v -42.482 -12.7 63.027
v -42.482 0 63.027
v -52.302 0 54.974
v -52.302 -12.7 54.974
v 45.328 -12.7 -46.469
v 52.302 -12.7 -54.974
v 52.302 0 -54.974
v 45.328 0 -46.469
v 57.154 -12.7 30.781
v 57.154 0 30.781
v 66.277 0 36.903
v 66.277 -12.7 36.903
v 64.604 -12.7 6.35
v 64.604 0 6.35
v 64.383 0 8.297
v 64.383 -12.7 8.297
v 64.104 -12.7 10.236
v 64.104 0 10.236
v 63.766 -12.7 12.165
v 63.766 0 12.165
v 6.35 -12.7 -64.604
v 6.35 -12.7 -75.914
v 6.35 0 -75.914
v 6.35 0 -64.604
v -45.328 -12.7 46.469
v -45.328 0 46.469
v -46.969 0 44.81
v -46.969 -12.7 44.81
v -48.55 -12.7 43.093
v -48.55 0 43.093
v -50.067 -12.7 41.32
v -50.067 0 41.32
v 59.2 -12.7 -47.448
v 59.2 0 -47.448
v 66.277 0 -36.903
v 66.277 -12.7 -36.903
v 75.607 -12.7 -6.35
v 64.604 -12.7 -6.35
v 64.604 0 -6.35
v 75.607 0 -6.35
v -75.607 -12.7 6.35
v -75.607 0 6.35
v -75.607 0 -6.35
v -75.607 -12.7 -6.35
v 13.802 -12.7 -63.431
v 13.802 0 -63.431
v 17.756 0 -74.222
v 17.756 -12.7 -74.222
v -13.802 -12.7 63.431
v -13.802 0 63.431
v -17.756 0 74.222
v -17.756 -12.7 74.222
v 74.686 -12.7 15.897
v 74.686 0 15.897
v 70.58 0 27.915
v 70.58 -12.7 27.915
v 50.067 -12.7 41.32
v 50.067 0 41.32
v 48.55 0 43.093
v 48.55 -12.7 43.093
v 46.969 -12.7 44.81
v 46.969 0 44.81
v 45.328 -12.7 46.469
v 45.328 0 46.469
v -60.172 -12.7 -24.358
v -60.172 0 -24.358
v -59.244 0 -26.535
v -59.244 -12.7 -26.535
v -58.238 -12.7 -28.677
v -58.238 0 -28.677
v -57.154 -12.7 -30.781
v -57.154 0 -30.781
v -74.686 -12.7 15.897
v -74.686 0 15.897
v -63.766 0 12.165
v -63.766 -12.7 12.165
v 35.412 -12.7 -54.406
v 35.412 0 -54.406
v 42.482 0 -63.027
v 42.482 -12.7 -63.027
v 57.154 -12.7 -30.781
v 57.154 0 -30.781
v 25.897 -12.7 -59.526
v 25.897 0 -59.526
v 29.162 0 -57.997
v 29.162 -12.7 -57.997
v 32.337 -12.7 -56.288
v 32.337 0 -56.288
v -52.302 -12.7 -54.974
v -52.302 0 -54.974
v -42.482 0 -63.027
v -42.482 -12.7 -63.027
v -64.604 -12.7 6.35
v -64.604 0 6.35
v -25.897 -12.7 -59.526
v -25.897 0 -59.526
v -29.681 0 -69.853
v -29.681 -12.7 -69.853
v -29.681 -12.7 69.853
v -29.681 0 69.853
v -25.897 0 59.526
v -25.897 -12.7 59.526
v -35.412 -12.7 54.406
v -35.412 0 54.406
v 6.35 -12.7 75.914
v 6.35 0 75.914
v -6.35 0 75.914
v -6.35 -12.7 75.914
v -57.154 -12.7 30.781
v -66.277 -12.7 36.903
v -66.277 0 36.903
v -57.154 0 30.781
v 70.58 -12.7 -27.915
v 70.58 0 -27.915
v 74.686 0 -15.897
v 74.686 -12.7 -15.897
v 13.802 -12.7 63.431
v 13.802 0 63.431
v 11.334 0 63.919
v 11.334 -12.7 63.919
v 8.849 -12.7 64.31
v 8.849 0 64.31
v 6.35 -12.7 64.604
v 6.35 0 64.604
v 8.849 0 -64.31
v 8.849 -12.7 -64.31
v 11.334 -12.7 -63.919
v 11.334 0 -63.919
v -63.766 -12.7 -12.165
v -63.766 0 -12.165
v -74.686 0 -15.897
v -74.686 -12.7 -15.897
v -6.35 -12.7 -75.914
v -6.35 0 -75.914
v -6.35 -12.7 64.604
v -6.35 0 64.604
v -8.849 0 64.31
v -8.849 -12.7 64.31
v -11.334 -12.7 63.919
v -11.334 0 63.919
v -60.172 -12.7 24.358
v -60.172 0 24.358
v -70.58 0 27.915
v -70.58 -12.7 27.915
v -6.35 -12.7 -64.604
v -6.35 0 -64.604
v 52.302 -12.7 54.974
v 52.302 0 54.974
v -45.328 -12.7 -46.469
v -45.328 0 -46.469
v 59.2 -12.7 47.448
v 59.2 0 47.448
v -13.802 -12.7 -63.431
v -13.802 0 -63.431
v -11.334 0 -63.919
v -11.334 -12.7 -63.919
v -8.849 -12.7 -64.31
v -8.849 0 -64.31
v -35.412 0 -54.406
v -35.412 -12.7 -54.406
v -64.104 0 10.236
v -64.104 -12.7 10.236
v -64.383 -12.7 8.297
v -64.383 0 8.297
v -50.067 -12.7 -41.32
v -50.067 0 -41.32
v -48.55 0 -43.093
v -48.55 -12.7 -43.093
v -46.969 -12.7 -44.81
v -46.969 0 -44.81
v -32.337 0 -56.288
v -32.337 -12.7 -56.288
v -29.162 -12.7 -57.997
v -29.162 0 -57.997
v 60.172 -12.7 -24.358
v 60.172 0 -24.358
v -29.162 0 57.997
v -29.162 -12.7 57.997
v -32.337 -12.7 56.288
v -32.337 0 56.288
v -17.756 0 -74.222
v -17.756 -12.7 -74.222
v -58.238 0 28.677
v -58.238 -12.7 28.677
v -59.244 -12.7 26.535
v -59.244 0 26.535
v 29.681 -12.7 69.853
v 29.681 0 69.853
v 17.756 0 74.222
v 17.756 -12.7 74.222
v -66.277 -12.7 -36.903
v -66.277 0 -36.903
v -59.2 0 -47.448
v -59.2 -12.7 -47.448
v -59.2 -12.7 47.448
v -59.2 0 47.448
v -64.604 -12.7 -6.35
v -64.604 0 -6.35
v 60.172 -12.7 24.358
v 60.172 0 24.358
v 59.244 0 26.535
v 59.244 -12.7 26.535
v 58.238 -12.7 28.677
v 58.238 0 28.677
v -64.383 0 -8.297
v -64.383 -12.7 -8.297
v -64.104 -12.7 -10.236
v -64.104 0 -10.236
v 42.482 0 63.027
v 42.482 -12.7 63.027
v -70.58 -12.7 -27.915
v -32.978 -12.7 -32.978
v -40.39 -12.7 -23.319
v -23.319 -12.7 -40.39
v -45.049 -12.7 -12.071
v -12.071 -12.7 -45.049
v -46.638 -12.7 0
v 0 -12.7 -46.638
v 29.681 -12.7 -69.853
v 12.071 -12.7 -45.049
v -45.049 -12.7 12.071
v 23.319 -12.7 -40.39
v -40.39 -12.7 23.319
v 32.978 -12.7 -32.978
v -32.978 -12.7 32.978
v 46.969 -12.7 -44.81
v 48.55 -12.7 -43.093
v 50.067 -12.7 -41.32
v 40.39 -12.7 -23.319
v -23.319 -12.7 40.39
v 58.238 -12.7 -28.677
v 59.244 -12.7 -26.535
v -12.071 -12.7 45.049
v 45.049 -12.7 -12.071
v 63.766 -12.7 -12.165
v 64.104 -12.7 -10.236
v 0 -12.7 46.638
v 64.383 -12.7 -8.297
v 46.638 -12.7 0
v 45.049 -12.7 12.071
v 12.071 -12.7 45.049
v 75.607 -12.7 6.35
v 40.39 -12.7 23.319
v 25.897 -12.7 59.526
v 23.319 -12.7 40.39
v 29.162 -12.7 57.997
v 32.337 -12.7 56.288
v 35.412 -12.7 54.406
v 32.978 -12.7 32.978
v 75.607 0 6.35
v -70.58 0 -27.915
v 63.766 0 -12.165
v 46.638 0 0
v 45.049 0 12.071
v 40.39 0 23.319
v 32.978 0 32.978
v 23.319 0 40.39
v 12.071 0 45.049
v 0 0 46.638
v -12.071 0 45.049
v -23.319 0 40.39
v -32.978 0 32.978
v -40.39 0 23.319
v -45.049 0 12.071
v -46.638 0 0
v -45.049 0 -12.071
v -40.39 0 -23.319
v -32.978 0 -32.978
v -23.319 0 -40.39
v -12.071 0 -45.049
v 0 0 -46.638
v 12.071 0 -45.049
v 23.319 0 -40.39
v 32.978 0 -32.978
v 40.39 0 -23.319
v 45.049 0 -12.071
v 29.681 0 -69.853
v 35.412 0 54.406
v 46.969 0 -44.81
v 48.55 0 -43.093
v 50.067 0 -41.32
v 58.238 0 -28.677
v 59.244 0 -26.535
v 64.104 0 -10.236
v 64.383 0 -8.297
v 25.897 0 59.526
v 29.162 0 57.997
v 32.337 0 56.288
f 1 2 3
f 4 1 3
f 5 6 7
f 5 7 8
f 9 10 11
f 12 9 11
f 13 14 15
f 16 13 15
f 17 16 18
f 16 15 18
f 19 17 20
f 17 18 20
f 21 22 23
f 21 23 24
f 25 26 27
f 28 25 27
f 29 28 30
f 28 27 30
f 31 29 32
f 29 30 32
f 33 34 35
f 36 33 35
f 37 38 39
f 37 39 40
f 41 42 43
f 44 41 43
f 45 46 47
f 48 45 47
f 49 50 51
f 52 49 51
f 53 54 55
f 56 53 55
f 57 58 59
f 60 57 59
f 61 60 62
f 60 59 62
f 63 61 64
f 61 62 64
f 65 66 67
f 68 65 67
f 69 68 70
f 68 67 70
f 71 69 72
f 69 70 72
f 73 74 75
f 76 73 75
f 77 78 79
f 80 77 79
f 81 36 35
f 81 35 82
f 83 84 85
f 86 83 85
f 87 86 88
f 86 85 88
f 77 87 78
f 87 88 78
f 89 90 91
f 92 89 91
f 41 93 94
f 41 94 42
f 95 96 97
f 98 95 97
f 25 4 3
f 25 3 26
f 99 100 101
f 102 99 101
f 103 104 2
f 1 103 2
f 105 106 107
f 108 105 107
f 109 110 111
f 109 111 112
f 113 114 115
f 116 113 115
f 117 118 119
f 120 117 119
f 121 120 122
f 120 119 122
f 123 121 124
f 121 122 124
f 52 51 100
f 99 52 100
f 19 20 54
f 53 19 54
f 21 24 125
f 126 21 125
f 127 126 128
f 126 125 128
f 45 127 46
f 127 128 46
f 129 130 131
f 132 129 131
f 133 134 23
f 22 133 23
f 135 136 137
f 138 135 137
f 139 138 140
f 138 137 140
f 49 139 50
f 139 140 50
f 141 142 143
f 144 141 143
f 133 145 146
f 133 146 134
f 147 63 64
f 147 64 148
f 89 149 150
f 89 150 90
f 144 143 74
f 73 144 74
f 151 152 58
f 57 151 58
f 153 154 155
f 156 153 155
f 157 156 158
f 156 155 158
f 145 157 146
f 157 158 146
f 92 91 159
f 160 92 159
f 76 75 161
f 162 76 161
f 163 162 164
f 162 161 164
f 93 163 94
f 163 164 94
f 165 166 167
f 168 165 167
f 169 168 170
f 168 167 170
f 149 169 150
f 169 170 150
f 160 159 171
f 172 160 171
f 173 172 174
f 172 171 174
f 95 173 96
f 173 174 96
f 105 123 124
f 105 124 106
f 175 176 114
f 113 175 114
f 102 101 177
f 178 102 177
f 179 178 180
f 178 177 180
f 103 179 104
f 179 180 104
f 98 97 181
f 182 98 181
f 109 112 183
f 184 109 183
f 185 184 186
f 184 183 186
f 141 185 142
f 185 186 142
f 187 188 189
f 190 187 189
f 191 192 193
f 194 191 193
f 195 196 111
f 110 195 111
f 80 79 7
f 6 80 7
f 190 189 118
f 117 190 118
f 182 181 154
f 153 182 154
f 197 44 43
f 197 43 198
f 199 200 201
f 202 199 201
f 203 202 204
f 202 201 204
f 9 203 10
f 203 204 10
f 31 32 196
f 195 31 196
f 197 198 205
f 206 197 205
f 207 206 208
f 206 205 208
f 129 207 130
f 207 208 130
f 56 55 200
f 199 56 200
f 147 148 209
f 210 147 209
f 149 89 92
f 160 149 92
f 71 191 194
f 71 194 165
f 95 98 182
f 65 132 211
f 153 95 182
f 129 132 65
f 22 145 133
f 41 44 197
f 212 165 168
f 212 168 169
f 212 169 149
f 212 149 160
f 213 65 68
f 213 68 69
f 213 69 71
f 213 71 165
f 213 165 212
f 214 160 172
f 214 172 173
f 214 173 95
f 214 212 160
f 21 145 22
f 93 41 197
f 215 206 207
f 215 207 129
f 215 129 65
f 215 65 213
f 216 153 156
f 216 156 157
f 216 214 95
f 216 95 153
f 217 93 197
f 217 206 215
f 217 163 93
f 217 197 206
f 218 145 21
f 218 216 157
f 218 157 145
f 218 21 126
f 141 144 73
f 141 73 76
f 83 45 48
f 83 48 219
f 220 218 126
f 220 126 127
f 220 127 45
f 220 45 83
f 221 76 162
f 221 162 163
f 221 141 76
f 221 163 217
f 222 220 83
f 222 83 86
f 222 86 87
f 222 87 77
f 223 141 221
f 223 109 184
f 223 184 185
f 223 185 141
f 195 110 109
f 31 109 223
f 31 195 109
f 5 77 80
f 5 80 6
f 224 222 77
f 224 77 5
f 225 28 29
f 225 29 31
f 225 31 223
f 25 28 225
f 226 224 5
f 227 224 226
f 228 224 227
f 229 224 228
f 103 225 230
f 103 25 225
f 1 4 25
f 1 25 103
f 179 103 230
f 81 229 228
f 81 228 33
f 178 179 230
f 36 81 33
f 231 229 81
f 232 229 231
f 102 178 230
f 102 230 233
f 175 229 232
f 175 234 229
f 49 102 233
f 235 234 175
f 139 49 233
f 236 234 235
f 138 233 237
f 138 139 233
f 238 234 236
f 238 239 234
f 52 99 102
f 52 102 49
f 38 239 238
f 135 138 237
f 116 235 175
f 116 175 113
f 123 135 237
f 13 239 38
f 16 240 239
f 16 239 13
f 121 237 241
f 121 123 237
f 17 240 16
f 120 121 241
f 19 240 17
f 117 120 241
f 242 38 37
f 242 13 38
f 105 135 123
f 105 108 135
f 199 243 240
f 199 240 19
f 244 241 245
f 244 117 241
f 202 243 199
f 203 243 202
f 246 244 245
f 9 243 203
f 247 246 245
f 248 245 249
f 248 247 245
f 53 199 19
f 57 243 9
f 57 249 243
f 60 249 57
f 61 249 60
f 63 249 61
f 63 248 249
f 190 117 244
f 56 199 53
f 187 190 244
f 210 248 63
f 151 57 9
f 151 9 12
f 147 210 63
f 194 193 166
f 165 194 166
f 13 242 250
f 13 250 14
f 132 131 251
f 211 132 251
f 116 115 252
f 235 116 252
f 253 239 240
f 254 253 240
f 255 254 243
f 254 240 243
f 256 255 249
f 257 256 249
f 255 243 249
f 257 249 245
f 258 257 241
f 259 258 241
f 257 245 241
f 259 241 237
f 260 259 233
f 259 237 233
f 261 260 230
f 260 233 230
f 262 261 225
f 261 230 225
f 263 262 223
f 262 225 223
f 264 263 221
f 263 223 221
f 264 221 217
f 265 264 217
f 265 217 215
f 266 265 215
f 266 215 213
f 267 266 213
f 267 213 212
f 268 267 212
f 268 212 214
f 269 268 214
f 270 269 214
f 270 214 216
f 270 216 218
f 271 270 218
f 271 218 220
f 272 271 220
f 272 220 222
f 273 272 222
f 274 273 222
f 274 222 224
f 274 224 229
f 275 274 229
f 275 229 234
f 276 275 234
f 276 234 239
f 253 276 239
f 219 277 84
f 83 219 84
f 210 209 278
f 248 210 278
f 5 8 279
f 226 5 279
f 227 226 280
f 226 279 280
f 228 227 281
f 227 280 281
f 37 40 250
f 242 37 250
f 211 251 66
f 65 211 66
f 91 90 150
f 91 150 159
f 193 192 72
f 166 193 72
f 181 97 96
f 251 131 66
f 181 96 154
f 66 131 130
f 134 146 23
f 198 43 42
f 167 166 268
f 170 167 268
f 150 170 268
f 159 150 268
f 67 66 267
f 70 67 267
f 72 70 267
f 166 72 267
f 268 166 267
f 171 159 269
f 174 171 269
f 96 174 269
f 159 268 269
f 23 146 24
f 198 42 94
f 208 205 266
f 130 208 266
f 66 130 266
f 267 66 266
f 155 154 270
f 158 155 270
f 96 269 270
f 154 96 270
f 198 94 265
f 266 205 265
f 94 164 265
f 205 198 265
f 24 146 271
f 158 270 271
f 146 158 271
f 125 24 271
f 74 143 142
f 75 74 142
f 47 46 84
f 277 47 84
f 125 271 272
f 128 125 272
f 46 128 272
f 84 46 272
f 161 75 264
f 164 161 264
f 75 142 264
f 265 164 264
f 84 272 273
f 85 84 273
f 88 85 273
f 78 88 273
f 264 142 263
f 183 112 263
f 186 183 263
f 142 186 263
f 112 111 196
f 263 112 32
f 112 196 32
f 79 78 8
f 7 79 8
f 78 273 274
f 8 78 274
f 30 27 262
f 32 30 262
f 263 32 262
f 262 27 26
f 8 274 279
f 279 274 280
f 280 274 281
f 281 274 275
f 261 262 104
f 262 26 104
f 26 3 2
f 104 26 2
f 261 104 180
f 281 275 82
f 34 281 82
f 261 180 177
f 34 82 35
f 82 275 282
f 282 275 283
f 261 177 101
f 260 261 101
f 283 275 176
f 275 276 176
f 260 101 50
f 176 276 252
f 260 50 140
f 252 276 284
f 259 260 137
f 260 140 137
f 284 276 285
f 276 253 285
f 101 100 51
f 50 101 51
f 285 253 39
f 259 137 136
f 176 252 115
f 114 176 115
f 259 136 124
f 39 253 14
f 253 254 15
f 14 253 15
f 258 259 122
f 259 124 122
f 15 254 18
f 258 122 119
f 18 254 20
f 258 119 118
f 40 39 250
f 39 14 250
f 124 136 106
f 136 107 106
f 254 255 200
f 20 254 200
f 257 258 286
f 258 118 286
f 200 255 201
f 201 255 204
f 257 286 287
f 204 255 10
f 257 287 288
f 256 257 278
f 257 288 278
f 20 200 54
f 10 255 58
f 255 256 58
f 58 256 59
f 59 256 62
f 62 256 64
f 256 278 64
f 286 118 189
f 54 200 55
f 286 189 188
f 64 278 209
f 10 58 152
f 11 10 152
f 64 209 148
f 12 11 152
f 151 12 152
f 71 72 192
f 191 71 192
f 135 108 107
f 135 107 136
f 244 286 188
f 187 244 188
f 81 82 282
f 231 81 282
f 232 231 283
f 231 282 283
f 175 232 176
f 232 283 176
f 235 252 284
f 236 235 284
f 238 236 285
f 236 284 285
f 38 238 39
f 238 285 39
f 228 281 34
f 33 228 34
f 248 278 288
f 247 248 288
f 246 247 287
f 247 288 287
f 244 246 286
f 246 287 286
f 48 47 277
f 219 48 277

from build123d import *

# Parameters (mm, degrees)
F1_DEPTH = 12.7
F2_R     = 46.63803
F3_DEPTH = 25.4


with BuildPart() as f1:
    # F0 (on Front) → F1 (new body)
    with BuildSketch(Plane.XZ):
        with BuildLine():
            ThreePointArc((-63.765545, 12.165316), (-64.250755, 9.267153), (-64.604312, 6.35))
            Line((-64.604312, 6.35), (-75.607494, 6.35))
            Line((-75.607494, 6.35), (-75.607494, 0))
            Line((-75.607494, 0), (-75.607494, -6.35))
            Line((-75.607494, -6.35), (-64.604312, -6.35))
            ThreePointArc((-64.604312, -6.35), (-64.250755, -9.267153), (-63.765545, -12.165316))
            Line((-63.765545, -12.165316), (-74.686304, -15.897153))
            Line((-74.686304, -15.897153), (-70.579622, -27.914854))
            Line((-70.579622, -27.914854), (-60.172292, -24.358467))
            ThreePointArc((-60.172292, -24.358467), (-58.750975, -27.610913), (-57.154014, -30.780811))
            Line((-57.154014, -30.780811), (-66.276509, -36.902763))
            Line((-66.276509, -36.902763), (-59.199606, -47.448258))
            Line((-59.199606, -47.448258), (-50.067208, -41.31966))
            ThreePointArc((-50.067208, -41.31966), (-47.767053, -43.958483), (-45.327995, -46.469479))
            Line((-45.327995, -46.469479), (-52.3023, -54.973564))
            Line((-52.3023, -54.973564), (-42.48234, -63.027035))
            Line((-42.48234, -63.027035), (-35.412164, -54.40605))
            ThreePointArc((-35.412164, -54.40605), (-30.761411, -57.164458), (-25.897226, -59.526241))
            Line((-25.897226, -59.526241), (-29.681084, -69.853042))
            Line((-29.681084, -69.853042), (-17.756371, -74.222393))
            Line((-17.756371, -74.222393), (-13.802402, -63.431328))
            ThreePointArc((-13.802402, -63.431328), (-10.093255, -64.126171), (-6.35, -64.604312))
            Line((-6.35, -64.604312), (-6.35, -75.913835))
            Line((-6.35, -75.913835), (0, -75.913835))
            Line((0, -75.913835), (6.35, -75.913835))
            Line((6.35, -75.913835), (6.35, -64.604312))
            ThreePointArc((6.35, -64.604312), (10.093255, -64.126171), (13.802402, -63.431328))
            Line((13.802402, -63.431328), (17.756371, -74.222393))
            Line((17.756371, -74.222393), (29.681084, -69.853042))
            Line((29.681084, -69.853042), (25.897226, -59.526241))
            ThreePointArc((25.897226, -59.526241), (30.761411, -57.164458), (35.412164, -54.40605))
            Line((35.412164, -54.40605), (42.48234, -63.027035))
            Line((42.48234, -63.027035), (52.3023, -54.973564))
            Line((52.3023, -54.973564), (45.327995, -46.469479))
            ThreePointArc((45.327995, -46.469479), (47.767053, -43.958483), (50.067208, -41.31966))
            Line((50.067208, -41.31966), (59.199606, -47.448258))
            Line((59.199606, -47.448258), (66.276509, -36.902763))
            Line((66.276509, -36.902763), (57.154014, -30.780811))
            ThreePointArc((57.154014, -30.780811), (58.750975, -27.610913), (60.172292, -24.358467))
            Line((60.172292, -24.358467), (70.579622, -27.914854))
            Line((70.579622, -27.914854), (74.686304, -15.897153))
            Line((74.686304, -15.897153), (63.765545, -12.165316))
            ThreePointArc((63.765545, -12.165316), (64.250755, -9.267153), (64.604312, -6.35))
            Line((64.604312, -6.35), (75.607494, -6.35))
            Line((75.607494, -6.35), (75.607494, 0))
            Line((75.607494, 0), (75.607494, 6.35))
            Line((75.607494, 6.35), (64.604312, 6.35))
            ThreePointArc((64.604312, 6.35), (64.250755, 9.267153), (63.765545, 12.165316))
            Line((63.765545, 12.165316), (74.686304, 15.897153))
            Line((74.686304, 15.897153), (70.579622, 27.914854))
            Line((70.579622, 27.914854), (60.172292, 24.358467))
            ThreePointArc((60.172292, 24.358467), (58.750975, 27.610913), (57.154014, 30.780811))
            Line((57.154014, 30.780811), (66.276509, 36.902763))
            Line((66.276509, 36.902763), (59.199606, 47.448258))
            Line((59.199606, 47.448258), (50.067208, 41.31966))
            ThreePointArc((50.067208, 41.31966), (47.767053, 43.958483), (45.327995, 46.469479))
            Line((45.327995, 46.469479), (52.3023, 54.973564))
            Line((52.3023, 54.973564), (42.48234, 63.027035))
            Line((42.48234, 63.027035), (35.412164, 54.40605))
            ThreePointArc((35.412164, 54.40605), (30.761411, 57.164458), (25.897226, 59.526241))
            Line((25.897226, 59.526241), (29.681084, 69.853042))
            Line((29.681084, 69.853042), (17.756371, 74.222393))
            Line((17.756371, 74.222393), (13.802402, 63.431328))
            ThreePointArc((13.802402, 63.431328), (10.093255, 64.126171), (6.35, 64.604312))
            Line((6.35, 64.604312), (6.35, 75.913835))
            Line((6.35, 75.913835), (0, 75.913835))
            Line((0, 75.913835), (-6.35, 75.913835))
            Line((-6.35, 75.913835), (-6.35, 64.604312))
            ThreePointArc((-6.35, 64.604312), (-10.093255, 64.126171), (-13.802402, 63.431328))
            Line((-13.802402, 63.431328), (-17.756371, 74.222393))
            Line((-17.756371, 74.222393), (-29.681084, 69.853042))
            Line((-29.681084, 69.853042), (-25.897226, 59.526241))
            ThreePointArc((-25.897226, 59.526241), (-30.761411, 57.164458), (-35.412164, 54.40605))
            Line((-35.412164, 54.40605), (-42.48234, 63.027035))
            Line((-42.48234, 63.027035), (-52.3023, 54.973564))
            Line((-52.3023, 54.973564), (-45.327995, 46.469479))
            ThreePointArc((-45.327995, 46.469479), (-47.767053, 43.958483), (-50.067208, 41.31966))
            Line((-50.067208, 41.31966), (-59.199606, 47.448258))
            Line((-59.199606, 47.448258), (-66.276509, 36.902763))
            Line((-66.276509, 36.902763), (-57.154014, 30.780811))
            ThreePointArc((-57.154014, 30.780811), (-58.750975, 27.610913), (-60.172292, 24.358467))
            Line((-60.172292, 24.358467), (-70.579622, 27.914854))
            Line((-70.579622, 27.914854), (-74.686304, 15.897153))
            Line((-74.686304, 15.897153), (-63.765545, 12.165316))
        make_face()
    extrude(amount=F1_DEPTH)

    # F2 (on face) → F3 (cut)
    with BuildSketch(Plane.XZ.offset(12.7)):
        Circle(F2_R)
    extrude(amount=-F3_DEPTH, mode=Mode.SUBTRACT)


solid = f1.part
